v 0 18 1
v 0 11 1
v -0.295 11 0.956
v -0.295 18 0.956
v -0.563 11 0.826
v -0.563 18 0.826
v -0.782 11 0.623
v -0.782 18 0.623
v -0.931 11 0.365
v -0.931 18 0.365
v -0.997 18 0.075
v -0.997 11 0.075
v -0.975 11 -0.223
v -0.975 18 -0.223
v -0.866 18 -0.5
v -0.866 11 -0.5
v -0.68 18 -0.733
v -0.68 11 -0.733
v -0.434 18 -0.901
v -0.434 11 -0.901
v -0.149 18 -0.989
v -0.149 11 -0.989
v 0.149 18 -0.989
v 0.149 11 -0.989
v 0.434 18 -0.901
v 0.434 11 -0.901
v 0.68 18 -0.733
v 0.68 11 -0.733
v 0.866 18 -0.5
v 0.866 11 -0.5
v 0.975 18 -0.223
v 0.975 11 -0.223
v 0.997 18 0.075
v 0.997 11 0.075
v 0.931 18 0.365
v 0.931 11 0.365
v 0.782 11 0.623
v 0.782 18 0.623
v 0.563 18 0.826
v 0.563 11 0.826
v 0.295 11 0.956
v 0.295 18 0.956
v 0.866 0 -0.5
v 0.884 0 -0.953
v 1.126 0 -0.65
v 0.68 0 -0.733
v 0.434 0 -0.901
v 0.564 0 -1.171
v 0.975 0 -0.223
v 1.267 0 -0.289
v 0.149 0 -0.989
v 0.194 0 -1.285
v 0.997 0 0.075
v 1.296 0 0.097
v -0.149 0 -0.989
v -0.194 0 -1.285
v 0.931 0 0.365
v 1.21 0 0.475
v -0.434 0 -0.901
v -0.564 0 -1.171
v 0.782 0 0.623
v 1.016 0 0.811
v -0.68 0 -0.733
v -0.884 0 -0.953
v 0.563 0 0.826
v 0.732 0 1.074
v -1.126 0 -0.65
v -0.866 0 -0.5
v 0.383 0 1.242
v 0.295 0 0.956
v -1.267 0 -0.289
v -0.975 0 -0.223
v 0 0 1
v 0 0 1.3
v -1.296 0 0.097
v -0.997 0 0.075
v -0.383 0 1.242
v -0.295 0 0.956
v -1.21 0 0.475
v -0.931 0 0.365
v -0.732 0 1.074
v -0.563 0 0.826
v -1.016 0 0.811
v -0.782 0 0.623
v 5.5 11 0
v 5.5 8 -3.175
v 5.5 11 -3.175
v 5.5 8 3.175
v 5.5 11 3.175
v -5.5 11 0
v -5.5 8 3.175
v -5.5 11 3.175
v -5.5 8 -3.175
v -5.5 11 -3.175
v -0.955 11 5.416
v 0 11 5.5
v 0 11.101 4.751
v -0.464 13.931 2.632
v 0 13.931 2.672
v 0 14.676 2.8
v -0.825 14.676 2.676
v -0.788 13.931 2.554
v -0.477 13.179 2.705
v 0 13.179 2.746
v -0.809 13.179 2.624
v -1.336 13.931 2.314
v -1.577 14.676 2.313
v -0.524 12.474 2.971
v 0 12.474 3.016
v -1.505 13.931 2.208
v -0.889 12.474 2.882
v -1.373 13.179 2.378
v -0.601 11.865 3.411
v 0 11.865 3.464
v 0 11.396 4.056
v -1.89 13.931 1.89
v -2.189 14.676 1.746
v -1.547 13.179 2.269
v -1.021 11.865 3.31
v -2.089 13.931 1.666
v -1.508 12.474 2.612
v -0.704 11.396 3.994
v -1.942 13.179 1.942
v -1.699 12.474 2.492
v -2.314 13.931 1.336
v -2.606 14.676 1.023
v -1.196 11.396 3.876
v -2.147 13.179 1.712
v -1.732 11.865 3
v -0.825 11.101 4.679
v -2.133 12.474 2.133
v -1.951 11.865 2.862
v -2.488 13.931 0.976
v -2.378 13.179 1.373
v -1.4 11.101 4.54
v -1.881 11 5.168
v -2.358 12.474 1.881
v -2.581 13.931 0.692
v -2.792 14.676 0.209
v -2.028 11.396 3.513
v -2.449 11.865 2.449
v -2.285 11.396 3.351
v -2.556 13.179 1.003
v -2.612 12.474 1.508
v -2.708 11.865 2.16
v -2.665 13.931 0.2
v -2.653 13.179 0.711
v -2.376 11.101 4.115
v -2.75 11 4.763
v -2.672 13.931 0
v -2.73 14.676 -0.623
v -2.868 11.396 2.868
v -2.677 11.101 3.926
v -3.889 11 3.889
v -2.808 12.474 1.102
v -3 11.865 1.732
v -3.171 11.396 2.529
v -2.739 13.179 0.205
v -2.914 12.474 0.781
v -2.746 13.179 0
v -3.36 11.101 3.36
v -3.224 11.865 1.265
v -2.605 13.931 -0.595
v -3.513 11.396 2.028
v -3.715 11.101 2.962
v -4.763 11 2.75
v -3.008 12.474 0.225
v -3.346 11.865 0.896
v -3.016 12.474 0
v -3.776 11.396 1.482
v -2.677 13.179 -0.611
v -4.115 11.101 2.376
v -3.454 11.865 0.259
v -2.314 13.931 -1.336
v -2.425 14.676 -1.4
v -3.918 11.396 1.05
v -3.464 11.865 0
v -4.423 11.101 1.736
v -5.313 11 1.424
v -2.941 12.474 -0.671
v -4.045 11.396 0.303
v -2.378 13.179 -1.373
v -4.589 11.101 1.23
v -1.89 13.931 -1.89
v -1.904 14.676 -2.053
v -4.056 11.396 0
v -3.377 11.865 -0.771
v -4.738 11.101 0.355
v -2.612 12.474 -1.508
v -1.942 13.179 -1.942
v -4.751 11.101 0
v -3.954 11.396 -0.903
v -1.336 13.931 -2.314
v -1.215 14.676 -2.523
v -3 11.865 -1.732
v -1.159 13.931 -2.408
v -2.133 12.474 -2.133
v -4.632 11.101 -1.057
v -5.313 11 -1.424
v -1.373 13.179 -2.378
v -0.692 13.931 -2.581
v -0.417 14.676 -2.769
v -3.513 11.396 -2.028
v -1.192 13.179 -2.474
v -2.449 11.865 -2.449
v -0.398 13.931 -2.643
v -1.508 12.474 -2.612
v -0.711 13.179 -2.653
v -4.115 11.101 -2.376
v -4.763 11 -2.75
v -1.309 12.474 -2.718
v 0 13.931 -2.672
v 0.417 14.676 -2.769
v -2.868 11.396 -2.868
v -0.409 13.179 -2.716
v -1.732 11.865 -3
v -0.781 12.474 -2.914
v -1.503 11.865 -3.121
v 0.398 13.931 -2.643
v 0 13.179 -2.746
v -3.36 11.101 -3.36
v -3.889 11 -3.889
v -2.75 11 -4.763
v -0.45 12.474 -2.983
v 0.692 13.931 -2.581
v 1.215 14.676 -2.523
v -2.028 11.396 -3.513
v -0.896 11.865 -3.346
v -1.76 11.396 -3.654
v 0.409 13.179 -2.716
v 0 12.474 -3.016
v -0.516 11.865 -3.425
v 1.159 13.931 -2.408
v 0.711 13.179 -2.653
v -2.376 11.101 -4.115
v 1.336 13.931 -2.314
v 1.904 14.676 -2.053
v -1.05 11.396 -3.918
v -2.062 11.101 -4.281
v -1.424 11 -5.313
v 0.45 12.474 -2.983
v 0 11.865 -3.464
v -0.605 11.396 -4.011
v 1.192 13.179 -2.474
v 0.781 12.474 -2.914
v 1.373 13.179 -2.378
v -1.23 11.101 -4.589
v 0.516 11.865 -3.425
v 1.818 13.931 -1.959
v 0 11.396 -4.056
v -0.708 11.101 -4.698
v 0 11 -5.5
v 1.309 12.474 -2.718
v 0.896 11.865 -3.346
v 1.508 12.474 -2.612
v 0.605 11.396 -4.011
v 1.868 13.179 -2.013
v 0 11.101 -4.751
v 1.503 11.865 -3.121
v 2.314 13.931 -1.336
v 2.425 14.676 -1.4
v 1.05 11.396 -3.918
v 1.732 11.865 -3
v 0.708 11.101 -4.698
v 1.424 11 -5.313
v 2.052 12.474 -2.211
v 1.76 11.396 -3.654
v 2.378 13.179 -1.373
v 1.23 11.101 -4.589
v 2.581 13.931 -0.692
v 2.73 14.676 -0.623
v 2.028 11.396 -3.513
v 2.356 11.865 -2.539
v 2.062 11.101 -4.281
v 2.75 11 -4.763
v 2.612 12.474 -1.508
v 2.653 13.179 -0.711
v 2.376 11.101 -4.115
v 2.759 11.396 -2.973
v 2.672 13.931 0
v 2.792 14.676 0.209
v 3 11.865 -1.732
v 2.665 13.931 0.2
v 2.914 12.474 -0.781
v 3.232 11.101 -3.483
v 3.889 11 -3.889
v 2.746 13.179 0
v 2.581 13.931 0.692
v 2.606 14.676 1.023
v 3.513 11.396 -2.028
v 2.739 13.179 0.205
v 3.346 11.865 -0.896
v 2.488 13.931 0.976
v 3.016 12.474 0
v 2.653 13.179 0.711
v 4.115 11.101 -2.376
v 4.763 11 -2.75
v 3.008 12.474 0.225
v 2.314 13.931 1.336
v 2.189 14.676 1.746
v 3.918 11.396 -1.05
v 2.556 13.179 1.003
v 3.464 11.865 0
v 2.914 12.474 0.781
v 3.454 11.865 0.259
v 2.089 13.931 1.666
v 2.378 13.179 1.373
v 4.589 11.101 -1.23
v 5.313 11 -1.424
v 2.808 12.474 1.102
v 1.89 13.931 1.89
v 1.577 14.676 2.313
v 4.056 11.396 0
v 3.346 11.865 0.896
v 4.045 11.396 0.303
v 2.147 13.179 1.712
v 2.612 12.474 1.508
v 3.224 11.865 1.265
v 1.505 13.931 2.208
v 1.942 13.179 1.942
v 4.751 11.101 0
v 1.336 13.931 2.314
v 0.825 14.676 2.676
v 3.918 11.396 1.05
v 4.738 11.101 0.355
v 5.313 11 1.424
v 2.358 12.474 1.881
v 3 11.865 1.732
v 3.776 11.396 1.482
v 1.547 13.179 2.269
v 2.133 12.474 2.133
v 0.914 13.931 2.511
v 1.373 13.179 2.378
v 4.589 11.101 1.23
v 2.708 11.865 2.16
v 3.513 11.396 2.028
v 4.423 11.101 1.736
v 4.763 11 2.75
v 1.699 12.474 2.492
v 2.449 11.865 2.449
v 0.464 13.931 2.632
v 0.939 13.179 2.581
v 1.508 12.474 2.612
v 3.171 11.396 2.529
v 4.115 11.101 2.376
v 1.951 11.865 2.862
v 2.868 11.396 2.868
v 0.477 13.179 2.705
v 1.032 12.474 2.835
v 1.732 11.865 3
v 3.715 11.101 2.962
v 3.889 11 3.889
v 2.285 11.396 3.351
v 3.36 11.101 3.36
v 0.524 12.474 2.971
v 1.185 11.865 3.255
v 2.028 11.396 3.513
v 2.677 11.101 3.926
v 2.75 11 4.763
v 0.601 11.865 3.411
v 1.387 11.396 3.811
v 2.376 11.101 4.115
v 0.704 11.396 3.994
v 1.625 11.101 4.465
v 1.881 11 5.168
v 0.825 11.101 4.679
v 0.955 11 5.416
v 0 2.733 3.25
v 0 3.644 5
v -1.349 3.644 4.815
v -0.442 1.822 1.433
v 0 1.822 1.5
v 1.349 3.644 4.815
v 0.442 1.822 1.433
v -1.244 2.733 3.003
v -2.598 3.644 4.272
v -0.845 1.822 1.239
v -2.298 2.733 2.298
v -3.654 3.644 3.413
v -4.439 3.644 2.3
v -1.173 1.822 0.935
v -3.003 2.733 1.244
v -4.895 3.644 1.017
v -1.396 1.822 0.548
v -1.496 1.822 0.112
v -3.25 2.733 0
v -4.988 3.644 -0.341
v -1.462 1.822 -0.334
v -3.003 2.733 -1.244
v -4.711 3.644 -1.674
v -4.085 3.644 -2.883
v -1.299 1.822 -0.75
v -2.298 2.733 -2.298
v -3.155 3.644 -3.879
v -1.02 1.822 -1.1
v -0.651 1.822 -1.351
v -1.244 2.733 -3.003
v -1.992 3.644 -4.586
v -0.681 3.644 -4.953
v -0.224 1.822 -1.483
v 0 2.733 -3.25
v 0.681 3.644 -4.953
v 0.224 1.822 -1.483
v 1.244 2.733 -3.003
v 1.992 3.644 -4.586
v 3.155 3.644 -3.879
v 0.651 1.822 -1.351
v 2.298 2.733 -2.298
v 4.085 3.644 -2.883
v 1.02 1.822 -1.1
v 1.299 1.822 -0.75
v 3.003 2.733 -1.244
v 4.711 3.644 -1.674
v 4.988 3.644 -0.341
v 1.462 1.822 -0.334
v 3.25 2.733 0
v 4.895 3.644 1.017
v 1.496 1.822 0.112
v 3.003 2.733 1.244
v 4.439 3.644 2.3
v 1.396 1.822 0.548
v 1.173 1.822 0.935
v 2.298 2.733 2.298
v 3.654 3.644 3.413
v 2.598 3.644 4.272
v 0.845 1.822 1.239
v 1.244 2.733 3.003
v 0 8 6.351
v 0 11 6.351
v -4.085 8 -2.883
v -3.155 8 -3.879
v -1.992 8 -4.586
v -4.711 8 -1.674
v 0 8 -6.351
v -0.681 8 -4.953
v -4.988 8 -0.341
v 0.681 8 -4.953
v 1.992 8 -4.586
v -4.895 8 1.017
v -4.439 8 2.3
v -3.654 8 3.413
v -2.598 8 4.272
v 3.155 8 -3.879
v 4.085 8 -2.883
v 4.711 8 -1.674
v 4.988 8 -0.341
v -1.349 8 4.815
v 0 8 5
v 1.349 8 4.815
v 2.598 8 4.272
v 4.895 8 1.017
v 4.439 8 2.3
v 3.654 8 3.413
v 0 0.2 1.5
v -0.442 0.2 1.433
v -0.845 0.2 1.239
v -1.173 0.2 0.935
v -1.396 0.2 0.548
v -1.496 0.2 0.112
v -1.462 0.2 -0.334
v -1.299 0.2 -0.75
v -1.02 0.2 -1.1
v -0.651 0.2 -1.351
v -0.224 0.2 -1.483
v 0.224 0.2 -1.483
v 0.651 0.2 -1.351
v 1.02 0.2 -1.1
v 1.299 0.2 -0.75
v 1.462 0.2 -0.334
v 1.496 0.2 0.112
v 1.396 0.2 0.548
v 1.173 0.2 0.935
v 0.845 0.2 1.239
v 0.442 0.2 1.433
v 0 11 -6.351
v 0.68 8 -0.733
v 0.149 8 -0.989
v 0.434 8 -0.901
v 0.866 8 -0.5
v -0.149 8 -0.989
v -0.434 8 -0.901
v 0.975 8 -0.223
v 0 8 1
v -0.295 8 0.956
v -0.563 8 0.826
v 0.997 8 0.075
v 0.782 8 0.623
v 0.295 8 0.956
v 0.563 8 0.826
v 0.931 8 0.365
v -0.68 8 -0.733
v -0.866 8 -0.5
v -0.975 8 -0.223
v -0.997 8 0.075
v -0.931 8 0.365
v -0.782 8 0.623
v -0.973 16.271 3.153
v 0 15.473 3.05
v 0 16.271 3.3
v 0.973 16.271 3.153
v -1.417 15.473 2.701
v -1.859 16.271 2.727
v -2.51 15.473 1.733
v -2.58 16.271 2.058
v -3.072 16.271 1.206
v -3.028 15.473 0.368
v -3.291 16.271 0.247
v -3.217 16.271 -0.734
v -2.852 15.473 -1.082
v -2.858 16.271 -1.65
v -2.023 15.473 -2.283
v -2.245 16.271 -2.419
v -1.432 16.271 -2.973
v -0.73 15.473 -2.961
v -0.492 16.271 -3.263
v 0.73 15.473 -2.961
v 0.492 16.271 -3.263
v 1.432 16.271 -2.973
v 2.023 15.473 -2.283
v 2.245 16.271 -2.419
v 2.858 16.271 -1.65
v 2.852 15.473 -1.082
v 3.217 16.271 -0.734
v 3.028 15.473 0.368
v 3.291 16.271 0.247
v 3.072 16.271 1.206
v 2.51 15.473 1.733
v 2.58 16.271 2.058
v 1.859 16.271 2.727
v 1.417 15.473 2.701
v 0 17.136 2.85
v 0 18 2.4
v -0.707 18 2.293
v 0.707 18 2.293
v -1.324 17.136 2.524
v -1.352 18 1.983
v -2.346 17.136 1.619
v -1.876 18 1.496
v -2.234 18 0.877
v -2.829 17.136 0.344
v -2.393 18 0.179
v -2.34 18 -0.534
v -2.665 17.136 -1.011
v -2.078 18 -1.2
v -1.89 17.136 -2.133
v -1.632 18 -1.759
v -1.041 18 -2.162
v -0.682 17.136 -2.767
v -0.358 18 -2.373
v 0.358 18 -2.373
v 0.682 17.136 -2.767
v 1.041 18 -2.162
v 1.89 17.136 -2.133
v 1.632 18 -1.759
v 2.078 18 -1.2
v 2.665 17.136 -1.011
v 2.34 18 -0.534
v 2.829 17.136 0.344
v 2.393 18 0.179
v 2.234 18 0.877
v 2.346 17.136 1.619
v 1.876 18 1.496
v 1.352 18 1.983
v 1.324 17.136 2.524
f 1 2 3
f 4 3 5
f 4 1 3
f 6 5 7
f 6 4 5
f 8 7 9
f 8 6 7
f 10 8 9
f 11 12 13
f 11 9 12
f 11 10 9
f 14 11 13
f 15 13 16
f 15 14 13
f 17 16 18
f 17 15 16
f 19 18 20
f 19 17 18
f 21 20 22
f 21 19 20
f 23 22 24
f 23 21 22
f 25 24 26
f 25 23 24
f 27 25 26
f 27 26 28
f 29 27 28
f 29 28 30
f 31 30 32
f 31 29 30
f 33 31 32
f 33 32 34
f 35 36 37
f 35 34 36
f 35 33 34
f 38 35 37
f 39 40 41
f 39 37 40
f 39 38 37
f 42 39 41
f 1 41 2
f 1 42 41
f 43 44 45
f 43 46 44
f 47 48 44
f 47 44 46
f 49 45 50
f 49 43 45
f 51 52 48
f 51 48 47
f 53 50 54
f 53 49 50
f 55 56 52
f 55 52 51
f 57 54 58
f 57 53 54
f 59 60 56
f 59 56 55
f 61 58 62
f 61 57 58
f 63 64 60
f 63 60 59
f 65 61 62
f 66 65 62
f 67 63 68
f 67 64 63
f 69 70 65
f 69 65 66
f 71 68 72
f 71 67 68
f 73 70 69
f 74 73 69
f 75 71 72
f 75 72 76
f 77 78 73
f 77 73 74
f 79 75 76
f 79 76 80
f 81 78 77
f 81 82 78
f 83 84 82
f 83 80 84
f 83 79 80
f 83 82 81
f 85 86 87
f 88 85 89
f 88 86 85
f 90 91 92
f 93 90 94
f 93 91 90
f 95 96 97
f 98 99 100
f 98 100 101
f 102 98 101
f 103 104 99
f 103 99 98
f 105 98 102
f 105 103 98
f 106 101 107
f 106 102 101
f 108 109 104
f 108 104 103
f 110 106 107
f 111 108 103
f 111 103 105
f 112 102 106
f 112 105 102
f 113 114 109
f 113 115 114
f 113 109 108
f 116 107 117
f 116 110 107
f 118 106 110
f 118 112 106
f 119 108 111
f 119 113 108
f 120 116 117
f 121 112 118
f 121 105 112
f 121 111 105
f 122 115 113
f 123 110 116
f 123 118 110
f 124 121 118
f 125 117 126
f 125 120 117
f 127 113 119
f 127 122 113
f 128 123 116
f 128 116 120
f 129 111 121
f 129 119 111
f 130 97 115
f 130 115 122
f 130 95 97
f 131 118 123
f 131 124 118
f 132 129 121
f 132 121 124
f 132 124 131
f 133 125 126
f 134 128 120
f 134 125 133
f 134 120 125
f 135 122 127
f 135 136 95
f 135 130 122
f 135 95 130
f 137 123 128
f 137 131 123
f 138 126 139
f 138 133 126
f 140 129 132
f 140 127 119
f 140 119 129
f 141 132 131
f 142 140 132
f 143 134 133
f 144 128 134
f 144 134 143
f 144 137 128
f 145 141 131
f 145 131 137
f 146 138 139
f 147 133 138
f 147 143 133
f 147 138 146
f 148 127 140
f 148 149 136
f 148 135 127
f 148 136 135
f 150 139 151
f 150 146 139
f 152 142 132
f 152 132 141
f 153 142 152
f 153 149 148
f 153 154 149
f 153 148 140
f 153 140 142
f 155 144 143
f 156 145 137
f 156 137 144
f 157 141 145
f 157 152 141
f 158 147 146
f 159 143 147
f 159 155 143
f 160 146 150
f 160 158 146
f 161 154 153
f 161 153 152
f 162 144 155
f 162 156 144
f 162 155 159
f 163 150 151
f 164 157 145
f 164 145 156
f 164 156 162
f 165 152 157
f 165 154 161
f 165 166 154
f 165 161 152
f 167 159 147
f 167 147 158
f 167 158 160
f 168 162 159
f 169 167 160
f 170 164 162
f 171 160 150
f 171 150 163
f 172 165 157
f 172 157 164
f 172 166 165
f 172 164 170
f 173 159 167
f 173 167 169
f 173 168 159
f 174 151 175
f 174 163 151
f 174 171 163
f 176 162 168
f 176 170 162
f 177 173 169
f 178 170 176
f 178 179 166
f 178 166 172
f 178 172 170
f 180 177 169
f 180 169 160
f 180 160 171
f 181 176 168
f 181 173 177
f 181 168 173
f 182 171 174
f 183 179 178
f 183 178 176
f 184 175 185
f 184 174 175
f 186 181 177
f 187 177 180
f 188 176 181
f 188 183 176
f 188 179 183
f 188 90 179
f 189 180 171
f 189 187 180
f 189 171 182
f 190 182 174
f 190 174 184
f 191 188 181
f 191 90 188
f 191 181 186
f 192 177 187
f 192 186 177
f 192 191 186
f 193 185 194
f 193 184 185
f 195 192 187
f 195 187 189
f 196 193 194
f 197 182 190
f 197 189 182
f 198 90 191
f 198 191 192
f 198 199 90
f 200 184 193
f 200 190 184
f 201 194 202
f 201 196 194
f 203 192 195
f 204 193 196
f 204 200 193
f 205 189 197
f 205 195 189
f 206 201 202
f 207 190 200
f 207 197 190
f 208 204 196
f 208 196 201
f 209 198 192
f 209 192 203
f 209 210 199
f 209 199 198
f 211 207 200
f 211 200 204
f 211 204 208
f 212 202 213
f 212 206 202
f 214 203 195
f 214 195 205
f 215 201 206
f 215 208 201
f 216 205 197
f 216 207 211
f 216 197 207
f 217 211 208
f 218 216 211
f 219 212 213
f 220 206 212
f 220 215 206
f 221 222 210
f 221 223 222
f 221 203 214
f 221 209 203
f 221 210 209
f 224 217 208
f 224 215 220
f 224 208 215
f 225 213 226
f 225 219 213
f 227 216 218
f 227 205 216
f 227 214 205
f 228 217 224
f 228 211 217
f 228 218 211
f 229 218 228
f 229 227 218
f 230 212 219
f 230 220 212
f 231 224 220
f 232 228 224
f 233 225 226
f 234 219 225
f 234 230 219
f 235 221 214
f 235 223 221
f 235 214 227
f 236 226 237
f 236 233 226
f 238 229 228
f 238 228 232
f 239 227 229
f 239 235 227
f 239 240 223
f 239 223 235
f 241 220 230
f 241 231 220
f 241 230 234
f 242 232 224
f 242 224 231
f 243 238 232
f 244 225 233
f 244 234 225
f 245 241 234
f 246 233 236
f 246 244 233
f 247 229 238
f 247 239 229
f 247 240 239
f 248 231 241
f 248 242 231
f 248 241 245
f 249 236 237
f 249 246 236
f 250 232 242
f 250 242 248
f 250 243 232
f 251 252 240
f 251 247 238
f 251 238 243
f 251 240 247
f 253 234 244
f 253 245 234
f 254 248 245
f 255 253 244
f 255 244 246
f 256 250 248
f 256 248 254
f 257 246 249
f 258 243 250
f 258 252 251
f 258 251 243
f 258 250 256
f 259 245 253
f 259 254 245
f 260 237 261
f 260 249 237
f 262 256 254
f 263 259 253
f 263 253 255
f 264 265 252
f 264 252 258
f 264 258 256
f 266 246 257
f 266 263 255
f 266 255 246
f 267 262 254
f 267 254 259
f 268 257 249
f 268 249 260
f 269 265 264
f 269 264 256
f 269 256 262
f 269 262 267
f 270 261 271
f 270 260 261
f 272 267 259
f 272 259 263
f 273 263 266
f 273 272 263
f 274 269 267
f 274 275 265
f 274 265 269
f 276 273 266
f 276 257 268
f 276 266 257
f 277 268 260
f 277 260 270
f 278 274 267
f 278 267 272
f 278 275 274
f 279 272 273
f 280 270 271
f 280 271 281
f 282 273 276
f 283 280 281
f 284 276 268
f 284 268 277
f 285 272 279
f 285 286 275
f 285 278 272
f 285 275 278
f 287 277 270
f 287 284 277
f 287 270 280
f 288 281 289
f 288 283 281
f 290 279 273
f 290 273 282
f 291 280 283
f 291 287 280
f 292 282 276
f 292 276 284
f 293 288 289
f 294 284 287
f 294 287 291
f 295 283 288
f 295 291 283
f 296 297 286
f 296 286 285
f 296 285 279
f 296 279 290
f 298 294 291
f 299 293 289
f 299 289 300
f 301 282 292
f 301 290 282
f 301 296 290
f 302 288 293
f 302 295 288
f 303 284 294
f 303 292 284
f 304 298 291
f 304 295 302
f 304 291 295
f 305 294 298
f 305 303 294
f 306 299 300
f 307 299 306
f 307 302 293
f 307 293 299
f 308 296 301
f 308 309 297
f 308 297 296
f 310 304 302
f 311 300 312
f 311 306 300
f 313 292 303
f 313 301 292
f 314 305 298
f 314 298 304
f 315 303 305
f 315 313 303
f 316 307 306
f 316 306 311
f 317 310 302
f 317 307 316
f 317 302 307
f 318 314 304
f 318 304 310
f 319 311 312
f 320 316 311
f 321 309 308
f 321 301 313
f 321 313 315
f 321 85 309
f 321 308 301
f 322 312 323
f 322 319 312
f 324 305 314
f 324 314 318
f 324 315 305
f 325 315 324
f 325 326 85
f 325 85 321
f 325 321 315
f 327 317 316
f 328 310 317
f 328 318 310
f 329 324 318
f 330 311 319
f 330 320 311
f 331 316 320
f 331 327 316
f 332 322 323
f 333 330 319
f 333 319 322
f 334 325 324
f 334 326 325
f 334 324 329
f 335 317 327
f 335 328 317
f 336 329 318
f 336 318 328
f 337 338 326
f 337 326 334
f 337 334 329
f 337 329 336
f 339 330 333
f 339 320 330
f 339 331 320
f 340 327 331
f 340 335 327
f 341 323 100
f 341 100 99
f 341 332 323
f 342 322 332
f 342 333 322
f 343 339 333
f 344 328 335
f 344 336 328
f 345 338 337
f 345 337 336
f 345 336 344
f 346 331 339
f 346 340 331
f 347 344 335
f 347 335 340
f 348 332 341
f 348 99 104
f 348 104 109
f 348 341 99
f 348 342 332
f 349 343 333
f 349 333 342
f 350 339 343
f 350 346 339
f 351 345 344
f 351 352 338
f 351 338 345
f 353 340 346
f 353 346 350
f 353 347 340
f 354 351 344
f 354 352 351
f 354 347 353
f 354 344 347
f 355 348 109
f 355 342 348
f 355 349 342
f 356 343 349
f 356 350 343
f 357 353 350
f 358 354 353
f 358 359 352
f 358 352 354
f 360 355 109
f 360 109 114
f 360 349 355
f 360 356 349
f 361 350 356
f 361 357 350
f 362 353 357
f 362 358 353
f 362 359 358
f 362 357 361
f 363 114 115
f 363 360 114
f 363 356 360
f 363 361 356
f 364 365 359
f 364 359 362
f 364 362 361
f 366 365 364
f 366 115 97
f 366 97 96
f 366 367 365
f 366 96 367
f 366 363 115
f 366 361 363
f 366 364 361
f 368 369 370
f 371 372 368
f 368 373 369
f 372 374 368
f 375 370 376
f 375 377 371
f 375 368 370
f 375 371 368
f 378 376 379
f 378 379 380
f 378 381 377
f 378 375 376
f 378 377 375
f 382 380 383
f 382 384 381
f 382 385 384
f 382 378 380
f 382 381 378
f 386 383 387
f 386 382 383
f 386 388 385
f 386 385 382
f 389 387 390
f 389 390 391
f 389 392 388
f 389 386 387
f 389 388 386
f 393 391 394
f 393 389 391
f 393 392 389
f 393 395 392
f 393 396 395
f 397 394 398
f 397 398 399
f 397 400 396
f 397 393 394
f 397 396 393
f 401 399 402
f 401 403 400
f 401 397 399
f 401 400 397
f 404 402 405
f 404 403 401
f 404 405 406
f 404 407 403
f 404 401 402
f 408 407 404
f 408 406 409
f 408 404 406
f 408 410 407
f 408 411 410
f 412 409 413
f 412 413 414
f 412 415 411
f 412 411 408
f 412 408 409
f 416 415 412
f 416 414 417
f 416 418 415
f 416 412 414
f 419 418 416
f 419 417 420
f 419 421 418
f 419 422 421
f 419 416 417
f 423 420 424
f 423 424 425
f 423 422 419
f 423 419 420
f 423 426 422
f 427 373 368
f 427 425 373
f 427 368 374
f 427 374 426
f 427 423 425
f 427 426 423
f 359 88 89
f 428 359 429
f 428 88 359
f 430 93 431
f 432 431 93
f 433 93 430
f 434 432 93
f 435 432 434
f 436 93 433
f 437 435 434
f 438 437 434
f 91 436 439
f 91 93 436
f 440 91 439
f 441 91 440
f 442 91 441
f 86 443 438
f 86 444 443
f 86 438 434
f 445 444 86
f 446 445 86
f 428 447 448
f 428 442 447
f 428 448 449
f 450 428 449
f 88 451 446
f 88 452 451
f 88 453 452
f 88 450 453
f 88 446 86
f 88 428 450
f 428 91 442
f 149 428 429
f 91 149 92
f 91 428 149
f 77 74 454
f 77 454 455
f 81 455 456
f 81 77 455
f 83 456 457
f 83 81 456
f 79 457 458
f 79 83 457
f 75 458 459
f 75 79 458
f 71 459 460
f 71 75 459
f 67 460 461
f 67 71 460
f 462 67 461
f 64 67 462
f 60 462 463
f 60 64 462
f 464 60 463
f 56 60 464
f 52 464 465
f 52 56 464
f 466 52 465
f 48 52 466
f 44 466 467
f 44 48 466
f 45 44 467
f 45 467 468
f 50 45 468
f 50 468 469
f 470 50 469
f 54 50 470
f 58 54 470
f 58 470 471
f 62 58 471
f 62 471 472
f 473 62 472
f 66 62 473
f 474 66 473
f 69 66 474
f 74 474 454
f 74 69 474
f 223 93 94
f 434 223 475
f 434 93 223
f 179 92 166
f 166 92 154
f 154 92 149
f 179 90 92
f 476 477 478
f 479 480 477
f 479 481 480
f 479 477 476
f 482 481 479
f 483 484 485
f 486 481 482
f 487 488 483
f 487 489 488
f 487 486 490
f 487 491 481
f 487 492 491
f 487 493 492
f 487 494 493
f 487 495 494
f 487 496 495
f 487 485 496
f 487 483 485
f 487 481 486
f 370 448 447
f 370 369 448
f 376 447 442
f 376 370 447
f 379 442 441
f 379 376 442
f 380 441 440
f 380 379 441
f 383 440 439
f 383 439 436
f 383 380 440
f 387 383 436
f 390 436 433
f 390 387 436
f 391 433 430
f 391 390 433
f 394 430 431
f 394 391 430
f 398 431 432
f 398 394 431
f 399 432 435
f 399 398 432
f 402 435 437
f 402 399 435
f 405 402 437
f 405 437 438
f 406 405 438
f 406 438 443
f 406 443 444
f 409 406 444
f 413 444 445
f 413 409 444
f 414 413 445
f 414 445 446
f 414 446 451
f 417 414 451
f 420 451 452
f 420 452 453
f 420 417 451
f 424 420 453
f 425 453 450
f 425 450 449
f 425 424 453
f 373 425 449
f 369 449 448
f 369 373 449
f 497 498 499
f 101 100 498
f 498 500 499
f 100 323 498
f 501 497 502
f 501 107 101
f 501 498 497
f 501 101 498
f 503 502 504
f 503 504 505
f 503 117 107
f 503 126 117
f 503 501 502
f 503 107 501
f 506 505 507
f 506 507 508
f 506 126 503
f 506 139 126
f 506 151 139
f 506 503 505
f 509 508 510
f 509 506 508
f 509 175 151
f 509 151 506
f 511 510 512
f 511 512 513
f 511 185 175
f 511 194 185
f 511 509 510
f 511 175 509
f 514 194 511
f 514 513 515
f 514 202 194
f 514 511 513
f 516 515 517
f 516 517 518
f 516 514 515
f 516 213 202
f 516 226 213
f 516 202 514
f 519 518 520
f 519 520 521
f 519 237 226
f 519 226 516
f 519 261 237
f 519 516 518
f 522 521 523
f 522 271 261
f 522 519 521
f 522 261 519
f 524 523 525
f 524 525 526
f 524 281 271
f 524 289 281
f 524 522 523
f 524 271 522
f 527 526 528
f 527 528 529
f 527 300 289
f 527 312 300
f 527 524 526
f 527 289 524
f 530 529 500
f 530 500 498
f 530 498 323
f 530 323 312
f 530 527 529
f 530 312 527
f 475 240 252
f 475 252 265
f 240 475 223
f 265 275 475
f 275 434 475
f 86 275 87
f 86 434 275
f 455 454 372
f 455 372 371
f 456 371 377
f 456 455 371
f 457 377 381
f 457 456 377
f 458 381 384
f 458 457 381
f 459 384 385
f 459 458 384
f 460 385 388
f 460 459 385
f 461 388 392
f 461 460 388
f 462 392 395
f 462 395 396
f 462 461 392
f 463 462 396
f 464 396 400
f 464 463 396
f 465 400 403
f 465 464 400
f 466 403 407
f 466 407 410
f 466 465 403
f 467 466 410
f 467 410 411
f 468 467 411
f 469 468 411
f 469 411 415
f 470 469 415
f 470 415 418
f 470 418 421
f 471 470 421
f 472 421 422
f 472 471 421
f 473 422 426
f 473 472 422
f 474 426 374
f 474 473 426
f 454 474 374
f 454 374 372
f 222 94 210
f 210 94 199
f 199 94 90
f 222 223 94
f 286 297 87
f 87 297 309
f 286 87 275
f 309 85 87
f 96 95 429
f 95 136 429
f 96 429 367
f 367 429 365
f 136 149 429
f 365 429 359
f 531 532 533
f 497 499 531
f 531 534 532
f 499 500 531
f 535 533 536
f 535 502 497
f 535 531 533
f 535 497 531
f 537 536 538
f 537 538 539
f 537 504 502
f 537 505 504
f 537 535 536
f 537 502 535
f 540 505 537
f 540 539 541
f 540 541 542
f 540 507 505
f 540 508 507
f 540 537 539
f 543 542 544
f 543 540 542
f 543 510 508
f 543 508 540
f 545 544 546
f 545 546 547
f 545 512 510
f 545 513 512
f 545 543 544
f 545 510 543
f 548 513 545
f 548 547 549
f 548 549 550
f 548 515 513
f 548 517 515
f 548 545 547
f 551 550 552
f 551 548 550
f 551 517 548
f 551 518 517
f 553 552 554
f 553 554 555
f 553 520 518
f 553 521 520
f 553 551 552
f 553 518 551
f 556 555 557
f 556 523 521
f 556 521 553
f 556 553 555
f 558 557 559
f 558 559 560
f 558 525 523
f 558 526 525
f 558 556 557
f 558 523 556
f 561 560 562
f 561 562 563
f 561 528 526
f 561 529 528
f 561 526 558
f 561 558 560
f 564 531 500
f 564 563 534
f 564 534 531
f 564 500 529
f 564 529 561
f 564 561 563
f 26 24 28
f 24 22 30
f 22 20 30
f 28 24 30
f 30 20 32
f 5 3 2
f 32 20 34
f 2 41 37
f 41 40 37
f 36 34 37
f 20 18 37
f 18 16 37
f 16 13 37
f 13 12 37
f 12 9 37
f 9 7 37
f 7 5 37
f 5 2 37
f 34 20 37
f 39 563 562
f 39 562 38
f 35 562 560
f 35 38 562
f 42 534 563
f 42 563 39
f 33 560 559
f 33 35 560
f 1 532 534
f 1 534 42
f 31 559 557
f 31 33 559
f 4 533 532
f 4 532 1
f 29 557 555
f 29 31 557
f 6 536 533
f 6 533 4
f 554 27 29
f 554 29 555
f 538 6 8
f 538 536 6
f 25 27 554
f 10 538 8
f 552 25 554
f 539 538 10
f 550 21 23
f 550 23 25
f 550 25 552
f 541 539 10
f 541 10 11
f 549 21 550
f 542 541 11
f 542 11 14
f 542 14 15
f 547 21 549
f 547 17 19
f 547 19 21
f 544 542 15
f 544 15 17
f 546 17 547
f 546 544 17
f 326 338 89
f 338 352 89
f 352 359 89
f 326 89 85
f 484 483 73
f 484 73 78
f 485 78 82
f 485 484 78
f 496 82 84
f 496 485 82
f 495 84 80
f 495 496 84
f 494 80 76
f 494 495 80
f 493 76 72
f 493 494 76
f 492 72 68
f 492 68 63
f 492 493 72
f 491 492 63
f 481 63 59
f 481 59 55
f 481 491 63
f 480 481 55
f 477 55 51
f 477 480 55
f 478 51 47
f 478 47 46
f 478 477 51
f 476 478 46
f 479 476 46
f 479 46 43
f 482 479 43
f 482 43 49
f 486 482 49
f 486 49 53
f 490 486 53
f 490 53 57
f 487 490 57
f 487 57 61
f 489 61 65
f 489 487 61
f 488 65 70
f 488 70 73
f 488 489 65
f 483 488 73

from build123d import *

# Parameters (mm, degrees)
EXTRUDE_1_DEPTH = 3
CHAMFER_1_SIZE  = 0.2


with BuildPart() as part:
    # 草图1 → 旋转2 (revolve)
    with BuildSketch(Plane.XY, mode=Mode.PRIVATE) as revolve_2_sk:
        with BuildLine():
            Line((-1, 18), (-2.4, 18))
            Line((-2.4, 18), (-3.3, 16.271116086))
            Line((-3.3, 16.271116086), (-2.8, 14.675583457))
            ThreePointArc((-2.8, 14.675583457), (-3.219653878, 12.154380629), (-5.5, 11))
            Line((-5.5, 11), (-5.5, 8))
            Line((-5.5, 8), (-5, 8))
            Line((-5, 8), (-5, 3.643969354))
            Line((-5, 3.643969354), (-1.5, 1.821984677))
            Line((-1.5, 1.821984677), (-1.5, 0))
            Line((-1.5, 0), (-1, 0))
            Line((-1, 0), (-1, 18))
        make_face()
    revolve(revolve_2_sk.sketch.rotate(Axis((0, 0, 0), (0, -1, 0)), 270), axis=Axis((0, 0, 0), (0, -1, 0)))

    # 草图2 → 拉伸1 (add)
    with BuildSketch(Plane.XZ.offset(-8)):
        Polygon((-5.5, 3.175426481), (-5.5, -3.175426481), (0, -6.350852961), (5.5, -3.175426481), (5.5, 3.175426481), (0, 6.350852961), align=None)
    extrude(amount=-EXTRUDE_1_DEPTH)

    # 倒角1
    chamfer_1_edges = [part.edges().sort_by_distance(p)[0] for p in [
        (0, 0, -1.5),
    ]]
    chamfer(chamfer_1_edges, length=CHAMFER_1_SIZE)


solid = part.part
